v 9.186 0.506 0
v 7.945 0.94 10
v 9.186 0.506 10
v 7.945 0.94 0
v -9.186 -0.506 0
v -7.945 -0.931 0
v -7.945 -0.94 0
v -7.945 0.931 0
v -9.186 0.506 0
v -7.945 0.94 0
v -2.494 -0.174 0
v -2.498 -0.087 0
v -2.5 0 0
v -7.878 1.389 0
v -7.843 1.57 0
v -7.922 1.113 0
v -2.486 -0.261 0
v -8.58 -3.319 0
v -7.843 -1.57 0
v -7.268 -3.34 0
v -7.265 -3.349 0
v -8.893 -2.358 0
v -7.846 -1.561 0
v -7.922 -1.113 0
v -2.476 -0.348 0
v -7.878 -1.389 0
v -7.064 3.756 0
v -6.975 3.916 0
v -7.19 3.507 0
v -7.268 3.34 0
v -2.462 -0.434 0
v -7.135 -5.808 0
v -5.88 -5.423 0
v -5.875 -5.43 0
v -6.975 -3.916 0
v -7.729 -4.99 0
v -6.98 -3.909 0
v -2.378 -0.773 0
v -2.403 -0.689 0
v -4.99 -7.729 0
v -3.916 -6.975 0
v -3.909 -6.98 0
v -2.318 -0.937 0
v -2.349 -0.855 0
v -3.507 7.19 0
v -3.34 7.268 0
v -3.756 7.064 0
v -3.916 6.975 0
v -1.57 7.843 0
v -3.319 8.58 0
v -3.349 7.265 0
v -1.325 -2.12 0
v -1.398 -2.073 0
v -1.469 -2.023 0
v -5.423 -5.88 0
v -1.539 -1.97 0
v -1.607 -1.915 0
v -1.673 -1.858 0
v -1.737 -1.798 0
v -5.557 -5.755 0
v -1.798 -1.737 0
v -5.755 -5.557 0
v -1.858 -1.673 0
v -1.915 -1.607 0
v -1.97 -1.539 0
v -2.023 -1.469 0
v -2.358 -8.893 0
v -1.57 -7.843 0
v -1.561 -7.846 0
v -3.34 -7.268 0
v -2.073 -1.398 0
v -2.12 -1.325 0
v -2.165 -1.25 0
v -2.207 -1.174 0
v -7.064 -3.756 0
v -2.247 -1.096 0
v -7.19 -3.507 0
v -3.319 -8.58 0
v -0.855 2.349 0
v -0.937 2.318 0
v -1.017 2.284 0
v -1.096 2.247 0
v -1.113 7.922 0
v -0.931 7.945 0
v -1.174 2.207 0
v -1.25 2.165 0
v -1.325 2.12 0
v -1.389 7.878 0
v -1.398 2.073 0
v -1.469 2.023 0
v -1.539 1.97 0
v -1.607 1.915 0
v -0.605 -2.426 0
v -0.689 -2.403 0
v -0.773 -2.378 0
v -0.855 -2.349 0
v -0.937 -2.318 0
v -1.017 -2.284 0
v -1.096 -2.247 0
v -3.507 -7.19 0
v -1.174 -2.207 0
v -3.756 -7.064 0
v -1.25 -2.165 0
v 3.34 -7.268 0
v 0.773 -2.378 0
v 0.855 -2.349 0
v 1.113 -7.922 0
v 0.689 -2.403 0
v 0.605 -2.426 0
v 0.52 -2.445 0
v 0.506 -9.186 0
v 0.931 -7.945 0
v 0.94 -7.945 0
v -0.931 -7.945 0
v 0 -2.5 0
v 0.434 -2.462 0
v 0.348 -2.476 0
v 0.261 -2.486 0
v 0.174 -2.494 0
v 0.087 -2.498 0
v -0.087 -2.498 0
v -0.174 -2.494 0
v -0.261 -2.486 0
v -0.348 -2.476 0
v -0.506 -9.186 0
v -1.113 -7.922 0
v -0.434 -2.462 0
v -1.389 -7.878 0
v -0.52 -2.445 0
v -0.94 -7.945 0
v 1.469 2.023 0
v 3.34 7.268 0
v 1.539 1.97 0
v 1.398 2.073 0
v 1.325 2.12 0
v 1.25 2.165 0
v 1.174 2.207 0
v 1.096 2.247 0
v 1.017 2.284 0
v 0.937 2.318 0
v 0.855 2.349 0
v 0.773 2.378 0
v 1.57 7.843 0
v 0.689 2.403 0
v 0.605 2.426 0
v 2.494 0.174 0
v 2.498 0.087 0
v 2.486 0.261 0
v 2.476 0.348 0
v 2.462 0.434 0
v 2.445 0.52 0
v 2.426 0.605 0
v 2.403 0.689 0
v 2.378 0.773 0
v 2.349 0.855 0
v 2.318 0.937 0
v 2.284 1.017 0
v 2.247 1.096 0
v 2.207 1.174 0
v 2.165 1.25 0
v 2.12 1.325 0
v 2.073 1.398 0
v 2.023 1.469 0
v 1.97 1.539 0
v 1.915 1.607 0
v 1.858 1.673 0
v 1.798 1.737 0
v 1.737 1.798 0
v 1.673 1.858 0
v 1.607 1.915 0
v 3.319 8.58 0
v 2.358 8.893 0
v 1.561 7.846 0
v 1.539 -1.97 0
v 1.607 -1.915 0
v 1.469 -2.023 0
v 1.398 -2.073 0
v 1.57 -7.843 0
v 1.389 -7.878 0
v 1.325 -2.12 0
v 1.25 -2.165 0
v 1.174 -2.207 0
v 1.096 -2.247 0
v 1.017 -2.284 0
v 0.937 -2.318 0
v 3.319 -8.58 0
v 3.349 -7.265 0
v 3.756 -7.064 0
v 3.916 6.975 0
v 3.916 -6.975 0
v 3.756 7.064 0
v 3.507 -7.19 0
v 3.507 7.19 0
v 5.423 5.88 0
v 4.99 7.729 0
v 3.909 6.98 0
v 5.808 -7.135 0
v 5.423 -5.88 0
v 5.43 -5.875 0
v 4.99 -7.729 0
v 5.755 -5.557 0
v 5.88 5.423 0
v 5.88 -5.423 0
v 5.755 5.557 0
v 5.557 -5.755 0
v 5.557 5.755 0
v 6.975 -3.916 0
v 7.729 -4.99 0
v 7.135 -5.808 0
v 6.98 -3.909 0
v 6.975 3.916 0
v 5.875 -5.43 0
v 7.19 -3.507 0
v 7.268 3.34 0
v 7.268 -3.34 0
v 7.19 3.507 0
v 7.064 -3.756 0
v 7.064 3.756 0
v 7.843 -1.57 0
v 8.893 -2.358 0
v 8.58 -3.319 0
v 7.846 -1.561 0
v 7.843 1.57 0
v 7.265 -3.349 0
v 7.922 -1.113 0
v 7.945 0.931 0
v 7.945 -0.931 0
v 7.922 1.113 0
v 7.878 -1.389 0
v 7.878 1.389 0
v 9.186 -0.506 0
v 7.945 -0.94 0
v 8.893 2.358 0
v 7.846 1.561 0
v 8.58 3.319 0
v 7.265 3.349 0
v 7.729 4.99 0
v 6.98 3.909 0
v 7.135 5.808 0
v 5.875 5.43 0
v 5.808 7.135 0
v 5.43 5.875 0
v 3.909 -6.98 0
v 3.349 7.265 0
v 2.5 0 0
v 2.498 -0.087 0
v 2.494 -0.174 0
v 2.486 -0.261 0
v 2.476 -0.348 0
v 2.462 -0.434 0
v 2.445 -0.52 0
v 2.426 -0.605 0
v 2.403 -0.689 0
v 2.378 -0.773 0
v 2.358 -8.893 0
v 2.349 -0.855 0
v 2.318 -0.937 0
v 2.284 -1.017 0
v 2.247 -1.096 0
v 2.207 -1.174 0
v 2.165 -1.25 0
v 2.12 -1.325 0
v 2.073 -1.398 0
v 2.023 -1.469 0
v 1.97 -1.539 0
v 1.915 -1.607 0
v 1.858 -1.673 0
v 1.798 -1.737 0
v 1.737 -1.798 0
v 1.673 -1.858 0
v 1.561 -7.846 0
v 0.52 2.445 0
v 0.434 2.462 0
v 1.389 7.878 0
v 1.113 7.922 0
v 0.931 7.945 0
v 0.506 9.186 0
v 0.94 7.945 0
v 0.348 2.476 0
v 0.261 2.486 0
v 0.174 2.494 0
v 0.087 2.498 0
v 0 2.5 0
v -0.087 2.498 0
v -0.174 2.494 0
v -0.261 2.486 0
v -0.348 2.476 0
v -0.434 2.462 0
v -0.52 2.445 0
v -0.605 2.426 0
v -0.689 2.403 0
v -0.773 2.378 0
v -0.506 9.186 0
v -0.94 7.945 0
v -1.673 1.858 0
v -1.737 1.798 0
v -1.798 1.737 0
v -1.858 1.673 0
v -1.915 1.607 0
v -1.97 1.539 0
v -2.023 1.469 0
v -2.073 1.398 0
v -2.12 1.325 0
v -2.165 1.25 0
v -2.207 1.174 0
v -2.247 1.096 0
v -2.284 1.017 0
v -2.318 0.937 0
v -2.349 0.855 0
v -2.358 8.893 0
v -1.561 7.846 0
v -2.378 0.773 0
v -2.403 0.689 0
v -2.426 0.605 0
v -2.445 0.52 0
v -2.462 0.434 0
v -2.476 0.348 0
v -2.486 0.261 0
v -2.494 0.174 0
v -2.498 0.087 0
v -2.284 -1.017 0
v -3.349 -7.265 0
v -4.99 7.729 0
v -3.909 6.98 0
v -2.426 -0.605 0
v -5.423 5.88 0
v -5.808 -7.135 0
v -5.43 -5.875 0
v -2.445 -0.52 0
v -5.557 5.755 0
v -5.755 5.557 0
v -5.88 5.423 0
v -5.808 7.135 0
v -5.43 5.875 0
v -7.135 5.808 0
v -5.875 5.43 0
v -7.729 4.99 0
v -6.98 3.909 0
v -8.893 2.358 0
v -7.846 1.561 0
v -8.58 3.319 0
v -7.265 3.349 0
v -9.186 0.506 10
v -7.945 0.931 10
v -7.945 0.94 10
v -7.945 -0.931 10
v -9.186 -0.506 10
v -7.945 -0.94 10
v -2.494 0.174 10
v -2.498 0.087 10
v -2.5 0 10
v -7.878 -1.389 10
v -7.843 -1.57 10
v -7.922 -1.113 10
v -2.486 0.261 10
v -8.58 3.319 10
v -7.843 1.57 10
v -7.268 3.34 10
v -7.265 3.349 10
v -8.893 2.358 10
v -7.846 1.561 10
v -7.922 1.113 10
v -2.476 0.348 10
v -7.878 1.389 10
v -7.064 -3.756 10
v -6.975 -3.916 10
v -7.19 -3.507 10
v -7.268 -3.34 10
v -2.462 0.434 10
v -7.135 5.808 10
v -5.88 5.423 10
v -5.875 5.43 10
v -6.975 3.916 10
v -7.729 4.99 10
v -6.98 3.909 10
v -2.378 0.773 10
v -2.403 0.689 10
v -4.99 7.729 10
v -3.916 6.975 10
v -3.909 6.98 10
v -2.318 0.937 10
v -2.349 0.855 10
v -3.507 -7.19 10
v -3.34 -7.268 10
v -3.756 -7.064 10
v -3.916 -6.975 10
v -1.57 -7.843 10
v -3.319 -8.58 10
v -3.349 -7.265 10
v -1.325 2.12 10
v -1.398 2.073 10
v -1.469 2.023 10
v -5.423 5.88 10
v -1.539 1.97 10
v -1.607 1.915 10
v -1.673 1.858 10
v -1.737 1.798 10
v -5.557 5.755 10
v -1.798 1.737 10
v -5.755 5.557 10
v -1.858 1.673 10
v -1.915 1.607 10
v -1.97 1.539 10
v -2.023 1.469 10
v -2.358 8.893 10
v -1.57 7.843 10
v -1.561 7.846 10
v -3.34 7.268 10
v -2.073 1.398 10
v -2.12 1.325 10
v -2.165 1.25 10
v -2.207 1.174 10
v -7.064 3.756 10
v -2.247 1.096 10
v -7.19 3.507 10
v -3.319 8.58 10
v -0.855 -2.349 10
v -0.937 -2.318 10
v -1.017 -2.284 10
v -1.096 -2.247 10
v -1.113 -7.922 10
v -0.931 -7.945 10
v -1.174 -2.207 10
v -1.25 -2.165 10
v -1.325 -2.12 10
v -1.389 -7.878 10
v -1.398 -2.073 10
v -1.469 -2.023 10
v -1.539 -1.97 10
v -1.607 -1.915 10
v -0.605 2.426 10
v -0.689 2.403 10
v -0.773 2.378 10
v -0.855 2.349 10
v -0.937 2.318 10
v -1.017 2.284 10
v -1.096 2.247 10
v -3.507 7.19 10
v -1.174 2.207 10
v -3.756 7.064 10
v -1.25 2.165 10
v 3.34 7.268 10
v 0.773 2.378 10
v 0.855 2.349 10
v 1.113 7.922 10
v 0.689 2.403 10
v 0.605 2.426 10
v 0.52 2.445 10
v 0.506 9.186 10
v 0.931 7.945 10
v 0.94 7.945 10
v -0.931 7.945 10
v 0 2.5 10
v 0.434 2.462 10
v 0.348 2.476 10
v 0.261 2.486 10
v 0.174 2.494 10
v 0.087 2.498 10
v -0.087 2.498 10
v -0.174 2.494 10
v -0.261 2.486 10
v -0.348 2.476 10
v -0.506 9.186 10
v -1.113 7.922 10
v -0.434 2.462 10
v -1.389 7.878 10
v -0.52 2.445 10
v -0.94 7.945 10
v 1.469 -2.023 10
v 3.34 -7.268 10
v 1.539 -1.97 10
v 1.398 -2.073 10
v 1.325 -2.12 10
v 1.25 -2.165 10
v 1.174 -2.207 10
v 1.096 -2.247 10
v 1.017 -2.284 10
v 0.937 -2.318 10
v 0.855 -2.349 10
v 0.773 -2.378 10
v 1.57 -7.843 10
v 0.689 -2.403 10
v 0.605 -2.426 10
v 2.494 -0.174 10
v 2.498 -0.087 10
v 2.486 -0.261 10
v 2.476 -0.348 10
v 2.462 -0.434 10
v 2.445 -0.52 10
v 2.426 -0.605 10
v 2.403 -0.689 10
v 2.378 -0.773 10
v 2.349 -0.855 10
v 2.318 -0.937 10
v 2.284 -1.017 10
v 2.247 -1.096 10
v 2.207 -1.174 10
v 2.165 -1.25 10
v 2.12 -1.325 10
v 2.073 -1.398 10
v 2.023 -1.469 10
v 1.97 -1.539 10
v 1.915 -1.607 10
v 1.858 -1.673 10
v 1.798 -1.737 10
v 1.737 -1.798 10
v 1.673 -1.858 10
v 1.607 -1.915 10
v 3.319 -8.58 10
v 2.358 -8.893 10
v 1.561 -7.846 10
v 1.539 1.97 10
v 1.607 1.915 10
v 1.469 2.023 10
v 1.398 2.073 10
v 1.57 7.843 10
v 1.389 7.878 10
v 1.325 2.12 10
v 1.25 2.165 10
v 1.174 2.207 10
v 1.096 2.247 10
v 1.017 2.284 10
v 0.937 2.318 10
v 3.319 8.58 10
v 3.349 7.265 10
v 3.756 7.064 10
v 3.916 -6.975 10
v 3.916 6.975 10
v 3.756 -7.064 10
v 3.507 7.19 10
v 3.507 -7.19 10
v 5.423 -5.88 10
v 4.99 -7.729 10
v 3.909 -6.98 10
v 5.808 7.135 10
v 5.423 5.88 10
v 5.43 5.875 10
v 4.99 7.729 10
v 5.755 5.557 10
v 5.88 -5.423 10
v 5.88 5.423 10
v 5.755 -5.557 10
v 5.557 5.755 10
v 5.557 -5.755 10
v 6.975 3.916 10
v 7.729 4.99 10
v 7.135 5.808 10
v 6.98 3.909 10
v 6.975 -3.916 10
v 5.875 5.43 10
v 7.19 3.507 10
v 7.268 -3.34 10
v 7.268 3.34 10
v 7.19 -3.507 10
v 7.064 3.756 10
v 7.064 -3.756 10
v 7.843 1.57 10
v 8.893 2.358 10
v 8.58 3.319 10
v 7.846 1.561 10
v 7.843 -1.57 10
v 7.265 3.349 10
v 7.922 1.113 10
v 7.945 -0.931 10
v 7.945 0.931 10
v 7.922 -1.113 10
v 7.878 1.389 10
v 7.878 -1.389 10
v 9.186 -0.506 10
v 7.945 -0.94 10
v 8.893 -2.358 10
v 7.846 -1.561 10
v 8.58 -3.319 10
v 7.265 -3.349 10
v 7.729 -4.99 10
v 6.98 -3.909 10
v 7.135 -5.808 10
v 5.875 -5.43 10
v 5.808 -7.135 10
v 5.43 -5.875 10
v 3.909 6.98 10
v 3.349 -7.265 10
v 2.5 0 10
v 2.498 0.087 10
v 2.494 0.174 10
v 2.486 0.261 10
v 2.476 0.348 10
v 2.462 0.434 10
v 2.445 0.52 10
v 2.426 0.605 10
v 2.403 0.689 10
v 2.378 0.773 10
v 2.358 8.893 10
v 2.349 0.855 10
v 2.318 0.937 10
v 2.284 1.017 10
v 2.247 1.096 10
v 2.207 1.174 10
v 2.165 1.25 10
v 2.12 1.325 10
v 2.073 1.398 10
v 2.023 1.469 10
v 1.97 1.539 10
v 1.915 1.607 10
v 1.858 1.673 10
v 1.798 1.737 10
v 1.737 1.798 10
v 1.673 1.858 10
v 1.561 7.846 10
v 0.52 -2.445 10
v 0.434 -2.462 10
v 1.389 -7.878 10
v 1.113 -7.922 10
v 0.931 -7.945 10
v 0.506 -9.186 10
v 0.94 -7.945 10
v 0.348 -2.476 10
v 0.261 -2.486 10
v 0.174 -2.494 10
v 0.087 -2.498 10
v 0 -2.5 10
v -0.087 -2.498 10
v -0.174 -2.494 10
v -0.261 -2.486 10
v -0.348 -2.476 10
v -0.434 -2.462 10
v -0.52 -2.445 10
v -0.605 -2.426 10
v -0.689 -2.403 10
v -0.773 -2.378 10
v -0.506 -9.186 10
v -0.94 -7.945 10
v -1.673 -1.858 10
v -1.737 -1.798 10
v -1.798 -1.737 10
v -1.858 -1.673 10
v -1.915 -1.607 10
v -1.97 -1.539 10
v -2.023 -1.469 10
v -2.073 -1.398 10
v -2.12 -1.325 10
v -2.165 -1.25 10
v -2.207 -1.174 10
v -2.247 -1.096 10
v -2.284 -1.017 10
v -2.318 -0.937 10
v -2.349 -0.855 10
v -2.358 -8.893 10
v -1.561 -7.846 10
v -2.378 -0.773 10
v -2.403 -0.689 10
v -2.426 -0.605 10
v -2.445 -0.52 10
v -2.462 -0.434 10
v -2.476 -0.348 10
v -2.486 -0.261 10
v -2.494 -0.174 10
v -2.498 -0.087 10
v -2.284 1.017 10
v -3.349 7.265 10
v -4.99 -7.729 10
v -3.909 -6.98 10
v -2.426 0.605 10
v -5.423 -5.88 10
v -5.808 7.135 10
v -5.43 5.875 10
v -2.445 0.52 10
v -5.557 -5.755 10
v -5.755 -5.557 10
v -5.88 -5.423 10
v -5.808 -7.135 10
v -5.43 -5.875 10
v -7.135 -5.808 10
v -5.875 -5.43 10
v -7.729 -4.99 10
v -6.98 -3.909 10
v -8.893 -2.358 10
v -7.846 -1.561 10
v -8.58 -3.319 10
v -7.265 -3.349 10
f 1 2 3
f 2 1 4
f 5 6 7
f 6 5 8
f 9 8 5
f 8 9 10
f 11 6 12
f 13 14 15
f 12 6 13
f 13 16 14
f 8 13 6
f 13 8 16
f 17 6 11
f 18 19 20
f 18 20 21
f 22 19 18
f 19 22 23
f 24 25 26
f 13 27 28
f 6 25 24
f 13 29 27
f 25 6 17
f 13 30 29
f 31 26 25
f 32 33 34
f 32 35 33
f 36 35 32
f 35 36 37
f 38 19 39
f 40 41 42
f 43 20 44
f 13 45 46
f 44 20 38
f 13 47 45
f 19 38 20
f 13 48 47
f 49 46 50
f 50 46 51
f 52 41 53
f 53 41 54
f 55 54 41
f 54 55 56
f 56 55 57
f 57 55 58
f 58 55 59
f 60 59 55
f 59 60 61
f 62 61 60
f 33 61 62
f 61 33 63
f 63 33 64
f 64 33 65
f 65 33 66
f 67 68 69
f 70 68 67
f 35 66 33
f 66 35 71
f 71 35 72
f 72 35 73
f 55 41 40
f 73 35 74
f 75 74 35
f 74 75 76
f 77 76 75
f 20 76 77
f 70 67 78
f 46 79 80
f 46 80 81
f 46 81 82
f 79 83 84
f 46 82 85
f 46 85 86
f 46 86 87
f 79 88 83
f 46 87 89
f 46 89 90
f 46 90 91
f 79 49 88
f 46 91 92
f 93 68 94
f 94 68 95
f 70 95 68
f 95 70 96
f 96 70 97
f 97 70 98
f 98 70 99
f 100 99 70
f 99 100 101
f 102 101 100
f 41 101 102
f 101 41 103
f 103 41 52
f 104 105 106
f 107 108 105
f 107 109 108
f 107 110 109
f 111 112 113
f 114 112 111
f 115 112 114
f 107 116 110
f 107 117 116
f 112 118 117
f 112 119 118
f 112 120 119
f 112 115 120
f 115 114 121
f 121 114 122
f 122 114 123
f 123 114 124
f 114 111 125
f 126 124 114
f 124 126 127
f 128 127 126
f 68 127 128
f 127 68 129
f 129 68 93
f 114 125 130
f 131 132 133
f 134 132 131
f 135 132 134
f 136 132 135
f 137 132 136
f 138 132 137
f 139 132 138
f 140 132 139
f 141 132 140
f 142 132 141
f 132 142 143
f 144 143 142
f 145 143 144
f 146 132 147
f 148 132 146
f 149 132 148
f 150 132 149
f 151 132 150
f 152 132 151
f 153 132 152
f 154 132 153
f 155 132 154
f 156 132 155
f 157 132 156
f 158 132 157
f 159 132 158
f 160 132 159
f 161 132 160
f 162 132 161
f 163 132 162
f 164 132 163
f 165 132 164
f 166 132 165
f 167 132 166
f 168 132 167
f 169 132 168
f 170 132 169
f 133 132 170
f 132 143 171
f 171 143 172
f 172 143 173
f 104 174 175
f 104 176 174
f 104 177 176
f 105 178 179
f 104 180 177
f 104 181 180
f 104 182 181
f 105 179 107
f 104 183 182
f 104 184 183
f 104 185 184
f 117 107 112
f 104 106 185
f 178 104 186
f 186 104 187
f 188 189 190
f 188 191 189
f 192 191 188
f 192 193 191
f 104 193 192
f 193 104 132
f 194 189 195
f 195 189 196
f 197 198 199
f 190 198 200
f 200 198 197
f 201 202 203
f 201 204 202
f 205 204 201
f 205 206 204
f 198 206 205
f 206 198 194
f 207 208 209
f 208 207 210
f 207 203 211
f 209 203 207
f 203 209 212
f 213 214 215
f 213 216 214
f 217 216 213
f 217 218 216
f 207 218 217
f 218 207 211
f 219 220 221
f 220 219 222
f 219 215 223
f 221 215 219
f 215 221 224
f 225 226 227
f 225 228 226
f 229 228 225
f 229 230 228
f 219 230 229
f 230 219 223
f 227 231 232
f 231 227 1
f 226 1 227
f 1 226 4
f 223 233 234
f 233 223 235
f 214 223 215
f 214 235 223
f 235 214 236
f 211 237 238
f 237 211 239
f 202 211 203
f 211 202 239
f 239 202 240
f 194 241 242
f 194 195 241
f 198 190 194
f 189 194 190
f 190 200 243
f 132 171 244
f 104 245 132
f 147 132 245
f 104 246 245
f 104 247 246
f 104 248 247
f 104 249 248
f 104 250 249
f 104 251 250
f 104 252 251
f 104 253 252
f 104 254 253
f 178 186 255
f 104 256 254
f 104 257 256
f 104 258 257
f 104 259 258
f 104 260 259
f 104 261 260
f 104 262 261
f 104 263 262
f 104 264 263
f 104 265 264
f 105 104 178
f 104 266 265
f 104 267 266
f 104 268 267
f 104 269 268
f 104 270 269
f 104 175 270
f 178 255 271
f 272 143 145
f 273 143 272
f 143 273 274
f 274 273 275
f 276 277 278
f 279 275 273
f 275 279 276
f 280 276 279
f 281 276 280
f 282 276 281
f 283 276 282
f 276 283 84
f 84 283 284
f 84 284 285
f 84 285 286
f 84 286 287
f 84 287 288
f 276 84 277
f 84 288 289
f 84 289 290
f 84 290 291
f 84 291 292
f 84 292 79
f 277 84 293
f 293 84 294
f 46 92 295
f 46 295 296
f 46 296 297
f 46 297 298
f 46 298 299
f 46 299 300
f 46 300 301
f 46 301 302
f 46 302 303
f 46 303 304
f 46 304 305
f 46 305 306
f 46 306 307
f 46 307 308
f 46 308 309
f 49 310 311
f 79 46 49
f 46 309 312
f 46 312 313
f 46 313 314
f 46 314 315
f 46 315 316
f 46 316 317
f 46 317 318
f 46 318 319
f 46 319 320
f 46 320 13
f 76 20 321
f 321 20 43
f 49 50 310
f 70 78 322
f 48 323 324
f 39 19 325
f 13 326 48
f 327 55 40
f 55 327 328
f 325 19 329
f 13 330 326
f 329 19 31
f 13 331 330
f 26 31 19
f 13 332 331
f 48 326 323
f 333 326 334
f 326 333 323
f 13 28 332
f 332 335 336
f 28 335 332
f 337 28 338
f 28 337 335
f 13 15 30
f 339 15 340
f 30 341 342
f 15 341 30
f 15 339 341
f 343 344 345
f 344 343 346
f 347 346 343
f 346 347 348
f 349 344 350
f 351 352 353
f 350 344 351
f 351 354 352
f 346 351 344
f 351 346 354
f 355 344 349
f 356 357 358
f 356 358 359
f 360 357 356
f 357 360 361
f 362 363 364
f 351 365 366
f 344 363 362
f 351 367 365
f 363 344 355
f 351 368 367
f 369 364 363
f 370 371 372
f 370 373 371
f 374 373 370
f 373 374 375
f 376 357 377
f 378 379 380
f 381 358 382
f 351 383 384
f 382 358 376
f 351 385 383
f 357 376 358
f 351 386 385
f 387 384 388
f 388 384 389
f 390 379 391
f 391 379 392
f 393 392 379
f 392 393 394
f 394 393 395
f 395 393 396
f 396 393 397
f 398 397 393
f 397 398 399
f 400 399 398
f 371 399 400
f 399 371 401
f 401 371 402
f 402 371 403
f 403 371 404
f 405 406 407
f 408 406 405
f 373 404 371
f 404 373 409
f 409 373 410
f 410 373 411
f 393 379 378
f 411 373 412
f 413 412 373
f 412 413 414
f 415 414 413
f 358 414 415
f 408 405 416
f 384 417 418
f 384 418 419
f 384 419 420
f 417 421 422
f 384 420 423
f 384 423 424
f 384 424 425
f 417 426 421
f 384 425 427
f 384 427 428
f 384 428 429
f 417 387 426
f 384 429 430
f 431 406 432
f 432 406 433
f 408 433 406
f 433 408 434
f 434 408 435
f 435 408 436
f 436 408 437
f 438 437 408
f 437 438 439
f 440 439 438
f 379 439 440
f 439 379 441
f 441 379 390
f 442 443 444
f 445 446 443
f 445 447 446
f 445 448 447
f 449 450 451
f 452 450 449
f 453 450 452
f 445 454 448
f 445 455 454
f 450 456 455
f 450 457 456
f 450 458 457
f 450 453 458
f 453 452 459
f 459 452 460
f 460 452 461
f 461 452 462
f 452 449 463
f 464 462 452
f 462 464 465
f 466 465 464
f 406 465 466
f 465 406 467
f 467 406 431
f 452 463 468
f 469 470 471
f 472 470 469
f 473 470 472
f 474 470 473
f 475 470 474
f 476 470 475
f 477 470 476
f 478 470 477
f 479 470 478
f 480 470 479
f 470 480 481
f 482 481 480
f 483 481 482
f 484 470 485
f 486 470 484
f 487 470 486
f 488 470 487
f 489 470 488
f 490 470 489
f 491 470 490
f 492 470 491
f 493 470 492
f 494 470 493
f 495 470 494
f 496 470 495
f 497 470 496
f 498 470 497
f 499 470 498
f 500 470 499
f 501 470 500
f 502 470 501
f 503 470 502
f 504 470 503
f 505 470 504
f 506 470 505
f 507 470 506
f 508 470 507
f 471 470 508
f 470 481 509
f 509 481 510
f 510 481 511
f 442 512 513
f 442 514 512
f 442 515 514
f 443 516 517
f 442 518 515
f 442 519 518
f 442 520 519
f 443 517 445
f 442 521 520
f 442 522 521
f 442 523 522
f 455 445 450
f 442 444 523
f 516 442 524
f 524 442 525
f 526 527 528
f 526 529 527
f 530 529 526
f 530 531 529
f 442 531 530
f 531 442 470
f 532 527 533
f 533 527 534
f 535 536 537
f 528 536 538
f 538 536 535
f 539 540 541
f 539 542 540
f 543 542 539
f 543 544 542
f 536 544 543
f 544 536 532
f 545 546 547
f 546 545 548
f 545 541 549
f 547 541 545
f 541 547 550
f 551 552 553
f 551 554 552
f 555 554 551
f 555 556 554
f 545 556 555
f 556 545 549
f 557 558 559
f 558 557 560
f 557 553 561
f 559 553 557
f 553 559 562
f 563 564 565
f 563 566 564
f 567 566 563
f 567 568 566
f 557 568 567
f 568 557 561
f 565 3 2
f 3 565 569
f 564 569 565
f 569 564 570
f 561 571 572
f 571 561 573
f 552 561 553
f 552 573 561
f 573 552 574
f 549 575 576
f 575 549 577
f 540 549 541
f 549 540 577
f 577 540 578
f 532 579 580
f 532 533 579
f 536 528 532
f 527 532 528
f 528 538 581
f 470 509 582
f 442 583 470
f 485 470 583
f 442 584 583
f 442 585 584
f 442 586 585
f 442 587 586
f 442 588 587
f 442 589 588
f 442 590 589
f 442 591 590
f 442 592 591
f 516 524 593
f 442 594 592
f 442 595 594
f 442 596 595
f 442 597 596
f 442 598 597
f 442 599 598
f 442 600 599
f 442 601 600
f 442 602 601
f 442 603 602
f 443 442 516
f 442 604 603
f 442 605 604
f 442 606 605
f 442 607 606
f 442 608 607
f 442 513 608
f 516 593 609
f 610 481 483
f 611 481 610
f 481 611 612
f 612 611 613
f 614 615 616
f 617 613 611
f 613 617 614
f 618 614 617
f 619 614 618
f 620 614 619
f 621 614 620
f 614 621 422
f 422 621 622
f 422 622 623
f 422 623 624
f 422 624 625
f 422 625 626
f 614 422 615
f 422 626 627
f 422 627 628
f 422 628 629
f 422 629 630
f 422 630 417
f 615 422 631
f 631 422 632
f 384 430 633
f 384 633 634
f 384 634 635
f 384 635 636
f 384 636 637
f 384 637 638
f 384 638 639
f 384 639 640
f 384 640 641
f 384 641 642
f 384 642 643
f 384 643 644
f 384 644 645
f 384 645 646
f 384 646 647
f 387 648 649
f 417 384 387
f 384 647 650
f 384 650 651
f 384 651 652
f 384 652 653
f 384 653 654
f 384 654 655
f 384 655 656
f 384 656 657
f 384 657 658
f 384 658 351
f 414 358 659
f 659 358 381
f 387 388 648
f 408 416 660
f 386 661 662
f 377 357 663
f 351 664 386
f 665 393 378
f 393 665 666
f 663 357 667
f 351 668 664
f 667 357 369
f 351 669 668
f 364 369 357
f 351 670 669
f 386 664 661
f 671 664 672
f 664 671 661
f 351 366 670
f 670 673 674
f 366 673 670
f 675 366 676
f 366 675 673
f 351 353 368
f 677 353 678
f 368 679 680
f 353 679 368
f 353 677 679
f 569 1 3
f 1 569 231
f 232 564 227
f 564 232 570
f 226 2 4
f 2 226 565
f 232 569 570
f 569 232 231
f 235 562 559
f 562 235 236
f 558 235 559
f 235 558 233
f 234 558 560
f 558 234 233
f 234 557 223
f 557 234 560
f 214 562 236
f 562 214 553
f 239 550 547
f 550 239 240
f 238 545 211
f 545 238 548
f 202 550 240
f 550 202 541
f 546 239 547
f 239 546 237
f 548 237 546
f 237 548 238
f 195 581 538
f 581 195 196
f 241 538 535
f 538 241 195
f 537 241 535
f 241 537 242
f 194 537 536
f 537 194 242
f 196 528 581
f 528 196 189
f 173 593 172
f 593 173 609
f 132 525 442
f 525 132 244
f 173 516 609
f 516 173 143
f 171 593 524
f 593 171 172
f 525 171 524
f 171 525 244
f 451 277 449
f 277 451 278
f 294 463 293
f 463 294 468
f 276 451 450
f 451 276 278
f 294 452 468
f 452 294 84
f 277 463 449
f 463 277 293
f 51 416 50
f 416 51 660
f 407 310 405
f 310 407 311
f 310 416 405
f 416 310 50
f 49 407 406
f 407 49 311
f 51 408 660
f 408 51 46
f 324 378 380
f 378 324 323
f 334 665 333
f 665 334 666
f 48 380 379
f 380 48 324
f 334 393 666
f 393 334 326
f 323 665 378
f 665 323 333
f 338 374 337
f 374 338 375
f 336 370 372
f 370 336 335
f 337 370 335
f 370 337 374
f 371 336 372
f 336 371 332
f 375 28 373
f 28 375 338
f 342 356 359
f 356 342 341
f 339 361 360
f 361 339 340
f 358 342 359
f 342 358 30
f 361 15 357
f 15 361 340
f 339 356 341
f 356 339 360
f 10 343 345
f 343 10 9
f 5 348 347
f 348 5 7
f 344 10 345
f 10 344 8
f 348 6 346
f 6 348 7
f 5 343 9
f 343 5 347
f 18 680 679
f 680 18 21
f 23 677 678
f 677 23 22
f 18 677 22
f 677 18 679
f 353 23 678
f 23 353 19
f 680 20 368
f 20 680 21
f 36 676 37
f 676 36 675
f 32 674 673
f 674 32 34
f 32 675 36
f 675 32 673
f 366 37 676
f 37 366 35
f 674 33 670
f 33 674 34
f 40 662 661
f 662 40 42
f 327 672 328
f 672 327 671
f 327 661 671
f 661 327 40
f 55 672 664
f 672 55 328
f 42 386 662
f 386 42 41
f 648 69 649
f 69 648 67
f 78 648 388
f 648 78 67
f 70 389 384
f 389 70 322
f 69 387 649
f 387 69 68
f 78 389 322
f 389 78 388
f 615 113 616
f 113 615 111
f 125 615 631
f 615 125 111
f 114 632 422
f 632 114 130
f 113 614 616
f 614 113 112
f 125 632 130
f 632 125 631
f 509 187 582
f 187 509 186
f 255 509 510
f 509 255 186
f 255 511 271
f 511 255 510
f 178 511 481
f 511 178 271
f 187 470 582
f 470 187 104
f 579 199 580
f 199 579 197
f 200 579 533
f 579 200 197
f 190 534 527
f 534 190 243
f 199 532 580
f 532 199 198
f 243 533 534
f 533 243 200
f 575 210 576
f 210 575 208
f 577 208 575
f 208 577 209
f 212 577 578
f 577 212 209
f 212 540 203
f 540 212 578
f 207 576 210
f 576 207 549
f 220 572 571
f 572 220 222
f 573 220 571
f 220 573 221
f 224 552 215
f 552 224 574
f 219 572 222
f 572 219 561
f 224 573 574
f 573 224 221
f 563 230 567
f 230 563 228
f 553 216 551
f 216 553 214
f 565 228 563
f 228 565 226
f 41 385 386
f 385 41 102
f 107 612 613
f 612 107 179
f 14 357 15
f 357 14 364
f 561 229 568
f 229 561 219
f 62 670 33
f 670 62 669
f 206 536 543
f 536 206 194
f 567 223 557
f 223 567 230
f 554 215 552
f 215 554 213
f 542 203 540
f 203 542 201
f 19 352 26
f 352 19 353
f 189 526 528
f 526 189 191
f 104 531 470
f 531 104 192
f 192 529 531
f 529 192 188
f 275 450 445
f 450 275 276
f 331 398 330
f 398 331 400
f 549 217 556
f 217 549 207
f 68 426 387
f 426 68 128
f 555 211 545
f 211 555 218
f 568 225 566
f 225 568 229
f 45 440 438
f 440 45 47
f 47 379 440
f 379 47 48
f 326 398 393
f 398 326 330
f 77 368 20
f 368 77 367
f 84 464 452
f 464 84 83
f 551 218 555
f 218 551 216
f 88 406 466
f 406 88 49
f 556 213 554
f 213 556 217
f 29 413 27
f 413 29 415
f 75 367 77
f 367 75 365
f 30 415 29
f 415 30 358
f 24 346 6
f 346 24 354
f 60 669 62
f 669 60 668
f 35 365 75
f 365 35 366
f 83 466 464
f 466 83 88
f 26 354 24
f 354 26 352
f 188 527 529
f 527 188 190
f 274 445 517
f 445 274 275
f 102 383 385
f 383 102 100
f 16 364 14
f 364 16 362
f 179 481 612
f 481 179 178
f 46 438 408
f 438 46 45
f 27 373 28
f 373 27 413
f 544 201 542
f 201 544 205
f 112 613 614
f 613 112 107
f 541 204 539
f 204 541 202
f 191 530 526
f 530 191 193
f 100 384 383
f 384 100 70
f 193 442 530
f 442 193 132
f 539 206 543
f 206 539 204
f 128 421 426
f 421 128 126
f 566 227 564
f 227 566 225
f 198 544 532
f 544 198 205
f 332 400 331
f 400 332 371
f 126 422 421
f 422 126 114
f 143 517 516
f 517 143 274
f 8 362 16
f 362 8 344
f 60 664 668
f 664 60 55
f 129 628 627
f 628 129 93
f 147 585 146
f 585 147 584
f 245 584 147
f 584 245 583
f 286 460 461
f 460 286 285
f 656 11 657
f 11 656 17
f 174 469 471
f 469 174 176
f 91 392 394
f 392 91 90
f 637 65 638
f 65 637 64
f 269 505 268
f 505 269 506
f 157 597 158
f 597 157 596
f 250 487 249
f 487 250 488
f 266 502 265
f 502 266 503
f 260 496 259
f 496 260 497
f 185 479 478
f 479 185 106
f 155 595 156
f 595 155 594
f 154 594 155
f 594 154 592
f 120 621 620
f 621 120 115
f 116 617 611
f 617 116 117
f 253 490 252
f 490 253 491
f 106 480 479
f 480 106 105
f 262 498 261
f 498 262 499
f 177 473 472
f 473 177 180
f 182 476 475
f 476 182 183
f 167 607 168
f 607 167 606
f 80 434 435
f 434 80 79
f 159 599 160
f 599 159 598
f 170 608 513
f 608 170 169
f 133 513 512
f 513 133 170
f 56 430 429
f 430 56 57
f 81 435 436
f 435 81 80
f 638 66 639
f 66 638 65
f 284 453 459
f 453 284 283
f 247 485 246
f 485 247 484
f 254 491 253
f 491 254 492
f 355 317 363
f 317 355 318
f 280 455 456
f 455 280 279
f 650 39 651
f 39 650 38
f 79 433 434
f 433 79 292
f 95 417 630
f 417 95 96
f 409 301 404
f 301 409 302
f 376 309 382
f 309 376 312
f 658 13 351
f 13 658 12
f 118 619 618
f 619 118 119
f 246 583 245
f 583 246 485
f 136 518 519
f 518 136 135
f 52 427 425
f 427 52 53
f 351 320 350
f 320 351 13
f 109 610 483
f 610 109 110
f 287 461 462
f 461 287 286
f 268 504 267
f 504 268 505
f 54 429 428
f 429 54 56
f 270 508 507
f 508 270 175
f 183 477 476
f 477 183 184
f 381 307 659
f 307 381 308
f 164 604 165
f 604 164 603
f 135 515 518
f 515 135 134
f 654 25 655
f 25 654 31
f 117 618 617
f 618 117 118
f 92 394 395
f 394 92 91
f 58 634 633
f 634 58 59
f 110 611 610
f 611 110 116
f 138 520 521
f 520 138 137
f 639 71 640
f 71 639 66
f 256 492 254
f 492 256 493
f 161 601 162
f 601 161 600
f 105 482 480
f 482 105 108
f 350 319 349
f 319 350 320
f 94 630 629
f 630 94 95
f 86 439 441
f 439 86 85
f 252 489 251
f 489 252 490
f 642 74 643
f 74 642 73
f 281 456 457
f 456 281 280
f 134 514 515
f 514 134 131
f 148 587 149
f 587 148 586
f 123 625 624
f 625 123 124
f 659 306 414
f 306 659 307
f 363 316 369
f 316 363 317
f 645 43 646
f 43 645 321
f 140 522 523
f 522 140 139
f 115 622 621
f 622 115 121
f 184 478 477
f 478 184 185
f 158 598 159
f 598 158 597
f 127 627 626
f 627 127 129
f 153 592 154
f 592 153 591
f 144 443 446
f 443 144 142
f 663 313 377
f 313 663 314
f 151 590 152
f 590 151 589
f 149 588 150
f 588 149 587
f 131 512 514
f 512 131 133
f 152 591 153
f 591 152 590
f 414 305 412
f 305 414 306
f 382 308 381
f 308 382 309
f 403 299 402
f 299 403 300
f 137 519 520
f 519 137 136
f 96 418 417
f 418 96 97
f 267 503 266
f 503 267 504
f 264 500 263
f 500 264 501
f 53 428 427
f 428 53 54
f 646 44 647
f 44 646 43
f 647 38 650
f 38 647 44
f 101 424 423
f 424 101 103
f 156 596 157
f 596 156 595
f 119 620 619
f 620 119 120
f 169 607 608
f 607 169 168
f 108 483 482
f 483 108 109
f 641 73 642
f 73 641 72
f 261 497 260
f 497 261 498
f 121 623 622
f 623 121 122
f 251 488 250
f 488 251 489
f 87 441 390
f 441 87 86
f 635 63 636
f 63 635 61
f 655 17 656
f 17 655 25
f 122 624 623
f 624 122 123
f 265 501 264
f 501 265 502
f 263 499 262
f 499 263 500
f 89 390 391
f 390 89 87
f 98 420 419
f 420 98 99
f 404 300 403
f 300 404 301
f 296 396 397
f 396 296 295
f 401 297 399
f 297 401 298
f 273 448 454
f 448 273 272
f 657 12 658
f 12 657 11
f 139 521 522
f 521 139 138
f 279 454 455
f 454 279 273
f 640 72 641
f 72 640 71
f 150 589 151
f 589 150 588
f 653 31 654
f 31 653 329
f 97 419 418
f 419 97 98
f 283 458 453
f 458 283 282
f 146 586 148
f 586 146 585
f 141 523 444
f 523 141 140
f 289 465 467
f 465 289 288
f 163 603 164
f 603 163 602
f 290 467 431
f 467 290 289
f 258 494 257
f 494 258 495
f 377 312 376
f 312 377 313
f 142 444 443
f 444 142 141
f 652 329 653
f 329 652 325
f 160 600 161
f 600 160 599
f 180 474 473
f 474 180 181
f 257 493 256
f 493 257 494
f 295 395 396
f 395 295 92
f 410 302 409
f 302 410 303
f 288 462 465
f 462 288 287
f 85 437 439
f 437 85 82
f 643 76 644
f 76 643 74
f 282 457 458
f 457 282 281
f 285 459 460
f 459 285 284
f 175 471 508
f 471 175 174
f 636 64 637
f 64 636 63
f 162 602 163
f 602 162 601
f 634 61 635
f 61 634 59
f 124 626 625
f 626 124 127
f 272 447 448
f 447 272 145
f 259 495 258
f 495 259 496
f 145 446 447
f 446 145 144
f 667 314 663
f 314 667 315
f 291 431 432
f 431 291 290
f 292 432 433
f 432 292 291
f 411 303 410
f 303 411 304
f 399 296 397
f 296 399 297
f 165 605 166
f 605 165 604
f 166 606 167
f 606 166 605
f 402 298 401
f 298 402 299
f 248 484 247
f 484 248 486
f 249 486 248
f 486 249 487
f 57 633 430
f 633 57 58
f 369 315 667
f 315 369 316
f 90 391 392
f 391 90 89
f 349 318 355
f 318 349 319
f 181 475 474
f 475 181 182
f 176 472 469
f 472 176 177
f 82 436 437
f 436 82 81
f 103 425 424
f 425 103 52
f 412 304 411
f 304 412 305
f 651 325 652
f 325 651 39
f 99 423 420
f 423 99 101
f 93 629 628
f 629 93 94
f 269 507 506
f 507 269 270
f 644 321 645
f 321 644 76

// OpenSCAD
$fn = 180;

// Simple parametric timing pulley approximation:
// - 20 teeth
// - pitch diameter = 12.22 mm (given)
// This model approximates tooth form as trapezoidal radial protrusions.
// For accurate belt profiles (GT2/HTD/etc.), replace tooth geometry accordingly.

teeth = 20;
pitch_d = 12.22;          // mm
pitch_r = pitch_d/2;

pulley_width = 10;        // mm
hub_d = 16;               // mm (body OD excluding teeth)
bore_d = 5;               // mm

// Tooth geometry (approximation)
tooth_height = 1.2;       // mm radial height above base OD
tooth_tip_frac = 0.35;    // fraction of tooth angular pitch at tip
tooth_root_frac = 0.75;   // fraction of tooth angular pitch at root

// Base radius chosen so that tooth tips are near pitch radius + small offset.
// This is an approximation; pitch circle is not explicitly enforced by tooth profile.
base_r = max(hub_d/2, pitch_r - 0.6);
tip_r  = base_r + tooth_height;

module tooth2d(a_pitch){
    // Create a trapezoid in polar coordinates (converted to XY points)
    a_root = a_pitch * tooth_root_frac;
    a_tip  = a_pitch * tooth_tip_frac;

    // Points ordered CCW
    pts = [
        [ base_r*cos(-a_root/2), base_r*sin(-a_root/2) ],
        [ tip_r *cos(-a_tip /2), tip_r *sin(-a_tip /2) ],
        [ tip_r *cos( a_tip /2), tip_r *sin( a_tip /2) ],
        [ base_r*cos( a_root/2), base_r*sin( a_root/2) ]
    ];
    polygon(points=pts);
}

module pulley(){
    a_pitch = 360/teeth;

    difference(){
        union(){
            // Main body
            cylinder(h=pulley_width, r=base_r, center=false);

            // Teeth
            for(i=[0:teeth-1]){
                rotate([0,0,i*a_pitch])
                    linear_extrude(height=pulley_width)
                        tooth2d(a_pitch);
            }
        }

        // Bore
        translate([0,0,-0.5])
            cylinder(h=pulley_width+1, d=bore_d, center=false);
    }
}

pulley();
